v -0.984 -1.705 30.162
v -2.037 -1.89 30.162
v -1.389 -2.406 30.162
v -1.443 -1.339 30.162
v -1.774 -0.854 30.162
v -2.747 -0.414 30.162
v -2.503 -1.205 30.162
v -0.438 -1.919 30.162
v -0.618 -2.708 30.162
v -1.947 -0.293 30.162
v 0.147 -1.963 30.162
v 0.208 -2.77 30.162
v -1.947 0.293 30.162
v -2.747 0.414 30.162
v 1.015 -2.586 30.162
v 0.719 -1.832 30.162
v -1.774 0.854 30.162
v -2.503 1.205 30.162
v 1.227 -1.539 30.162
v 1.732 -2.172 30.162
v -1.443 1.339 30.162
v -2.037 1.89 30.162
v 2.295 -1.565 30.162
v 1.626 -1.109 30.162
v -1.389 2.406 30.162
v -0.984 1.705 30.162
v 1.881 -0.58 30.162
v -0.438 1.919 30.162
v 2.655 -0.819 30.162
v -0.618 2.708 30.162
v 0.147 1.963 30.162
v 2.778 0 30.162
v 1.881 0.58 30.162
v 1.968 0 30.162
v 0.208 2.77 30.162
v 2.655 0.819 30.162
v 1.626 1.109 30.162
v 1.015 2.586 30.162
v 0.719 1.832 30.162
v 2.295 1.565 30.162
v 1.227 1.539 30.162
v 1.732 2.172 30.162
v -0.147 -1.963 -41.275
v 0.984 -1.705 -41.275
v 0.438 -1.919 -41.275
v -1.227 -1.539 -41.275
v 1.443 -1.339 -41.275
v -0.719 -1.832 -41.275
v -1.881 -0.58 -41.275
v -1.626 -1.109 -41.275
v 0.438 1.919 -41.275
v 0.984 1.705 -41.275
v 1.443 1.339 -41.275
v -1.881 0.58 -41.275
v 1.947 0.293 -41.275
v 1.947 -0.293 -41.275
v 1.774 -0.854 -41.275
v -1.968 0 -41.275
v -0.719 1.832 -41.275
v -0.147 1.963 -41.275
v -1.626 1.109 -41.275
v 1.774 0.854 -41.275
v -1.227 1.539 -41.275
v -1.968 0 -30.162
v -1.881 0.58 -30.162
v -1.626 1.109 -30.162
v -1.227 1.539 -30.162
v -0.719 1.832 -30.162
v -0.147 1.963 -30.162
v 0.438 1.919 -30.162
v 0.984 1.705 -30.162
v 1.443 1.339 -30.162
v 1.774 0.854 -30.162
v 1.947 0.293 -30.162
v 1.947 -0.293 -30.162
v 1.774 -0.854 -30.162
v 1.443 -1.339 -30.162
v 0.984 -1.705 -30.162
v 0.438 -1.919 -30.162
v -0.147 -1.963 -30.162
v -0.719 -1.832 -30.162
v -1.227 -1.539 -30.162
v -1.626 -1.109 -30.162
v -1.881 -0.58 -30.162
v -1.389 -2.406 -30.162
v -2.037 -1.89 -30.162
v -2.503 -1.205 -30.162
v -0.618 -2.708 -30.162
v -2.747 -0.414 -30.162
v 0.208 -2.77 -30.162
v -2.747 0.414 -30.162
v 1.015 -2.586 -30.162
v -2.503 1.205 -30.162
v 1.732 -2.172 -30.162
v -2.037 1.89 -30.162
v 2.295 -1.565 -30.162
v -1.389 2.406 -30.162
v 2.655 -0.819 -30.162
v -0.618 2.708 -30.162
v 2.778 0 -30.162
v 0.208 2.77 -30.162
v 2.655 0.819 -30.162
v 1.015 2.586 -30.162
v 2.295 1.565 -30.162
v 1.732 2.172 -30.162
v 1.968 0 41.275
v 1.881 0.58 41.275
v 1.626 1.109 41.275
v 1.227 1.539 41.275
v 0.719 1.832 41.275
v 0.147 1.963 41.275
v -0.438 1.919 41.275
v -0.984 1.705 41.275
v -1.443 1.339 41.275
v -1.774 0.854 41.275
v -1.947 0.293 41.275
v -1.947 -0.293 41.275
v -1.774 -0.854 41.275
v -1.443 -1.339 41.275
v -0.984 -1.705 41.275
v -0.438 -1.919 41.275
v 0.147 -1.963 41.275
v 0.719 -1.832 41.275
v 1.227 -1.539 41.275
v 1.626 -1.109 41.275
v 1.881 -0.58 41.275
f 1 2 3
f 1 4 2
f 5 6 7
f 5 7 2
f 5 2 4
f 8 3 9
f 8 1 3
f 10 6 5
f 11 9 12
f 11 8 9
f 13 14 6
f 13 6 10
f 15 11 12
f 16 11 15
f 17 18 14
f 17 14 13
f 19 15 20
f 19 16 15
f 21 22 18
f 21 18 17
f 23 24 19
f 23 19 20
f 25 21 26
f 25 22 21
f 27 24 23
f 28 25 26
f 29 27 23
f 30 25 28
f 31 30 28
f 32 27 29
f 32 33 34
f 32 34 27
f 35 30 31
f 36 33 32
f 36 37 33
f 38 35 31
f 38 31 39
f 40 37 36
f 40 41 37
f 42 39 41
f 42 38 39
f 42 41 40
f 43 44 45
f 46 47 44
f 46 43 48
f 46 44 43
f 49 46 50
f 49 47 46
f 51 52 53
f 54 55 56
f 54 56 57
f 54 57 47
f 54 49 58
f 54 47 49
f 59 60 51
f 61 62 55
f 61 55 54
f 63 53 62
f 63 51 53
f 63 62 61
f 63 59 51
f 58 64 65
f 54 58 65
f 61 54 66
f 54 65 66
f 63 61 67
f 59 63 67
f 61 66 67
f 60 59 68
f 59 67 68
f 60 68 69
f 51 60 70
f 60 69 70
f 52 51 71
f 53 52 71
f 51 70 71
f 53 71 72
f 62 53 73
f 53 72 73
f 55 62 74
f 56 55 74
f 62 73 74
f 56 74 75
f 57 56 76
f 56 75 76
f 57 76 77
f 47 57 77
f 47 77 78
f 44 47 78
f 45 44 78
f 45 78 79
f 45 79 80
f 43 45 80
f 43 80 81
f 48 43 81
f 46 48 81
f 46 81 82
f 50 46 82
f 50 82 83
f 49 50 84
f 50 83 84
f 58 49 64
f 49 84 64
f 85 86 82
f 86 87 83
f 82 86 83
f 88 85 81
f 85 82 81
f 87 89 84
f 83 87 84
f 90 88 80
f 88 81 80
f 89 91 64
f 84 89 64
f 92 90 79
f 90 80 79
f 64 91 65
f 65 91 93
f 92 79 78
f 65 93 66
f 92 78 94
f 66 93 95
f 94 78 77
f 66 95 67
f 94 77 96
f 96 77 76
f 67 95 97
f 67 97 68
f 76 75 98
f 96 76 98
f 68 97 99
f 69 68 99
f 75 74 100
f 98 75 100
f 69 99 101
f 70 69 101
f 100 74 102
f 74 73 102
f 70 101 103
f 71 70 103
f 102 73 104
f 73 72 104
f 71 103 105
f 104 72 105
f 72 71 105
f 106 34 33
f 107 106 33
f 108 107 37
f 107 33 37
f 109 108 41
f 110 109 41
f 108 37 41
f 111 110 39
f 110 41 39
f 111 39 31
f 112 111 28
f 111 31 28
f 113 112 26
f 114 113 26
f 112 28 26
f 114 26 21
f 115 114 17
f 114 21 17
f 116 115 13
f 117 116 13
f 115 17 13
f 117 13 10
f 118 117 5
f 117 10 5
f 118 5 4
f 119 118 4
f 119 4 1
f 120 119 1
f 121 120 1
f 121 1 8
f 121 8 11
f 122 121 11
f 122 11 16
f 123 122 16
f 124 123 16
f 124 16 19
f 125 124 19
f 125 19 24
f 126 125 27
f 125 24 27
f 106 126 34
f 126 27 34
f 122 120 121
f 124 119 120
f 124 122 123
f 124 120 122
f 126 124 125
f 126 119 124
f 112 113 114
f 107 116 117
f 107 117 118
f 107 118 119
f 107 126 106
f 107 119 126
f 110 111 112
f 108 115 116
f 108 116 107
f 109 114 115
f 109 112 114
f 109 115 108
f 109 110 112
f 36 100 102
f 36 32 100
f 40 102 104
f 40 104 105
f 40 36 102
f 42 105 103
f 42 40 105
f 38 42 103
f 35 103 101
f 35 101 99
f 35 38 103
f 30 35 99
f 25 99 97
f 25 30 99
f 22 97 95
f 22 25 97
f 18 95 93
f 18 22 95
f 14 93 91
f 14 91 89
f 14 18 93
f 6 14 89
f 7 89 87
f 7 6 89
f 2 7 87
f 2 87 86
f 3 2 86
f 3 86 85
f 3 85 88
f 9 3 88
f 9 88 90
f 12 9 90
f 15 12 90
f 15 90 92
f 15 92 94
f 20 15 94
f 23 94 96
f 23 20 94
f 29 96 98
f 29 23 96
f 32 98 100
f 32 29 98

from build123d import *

# Parameters (mm, degrees)
SKETCH2_R      = 2.778125
EXTRUDE1_DEPTH = 30.1625
SKETCH3_R      = 1.9685
EXTRUDE2_DEPTH = 11.1125
SKETCH4_R      = 1.9685
EXTRUDE3_DEPTH = 11.1125


with BuildPart() as part:
    # Sketch2 → Extrude1 (new body, symmetric)
    with BuildSketch(Plane.XY):
        Circle(SKETCH2_R)
    extrude(amount=EXTRUDE1_DEPTH, both=True)

    # Sketch3 → Extrude2 (add)
    with BuildSketch(Plane.XY.offset(30.1625)):
        Circle(SKETCH3_R)
    extrude(amount=EXTRUDE2_DEPTH)

    # Sketch4 → Extrude3 (add)
    with BuildSketch(Plane(origin=(0, 0, -30.1625), x_dir=(-1, 0, 0), z_dir=(0, 0, -1))):
        Circle(SKETCH4_R)
    extrude(amount=EXTRUDE3_DEPTH)


solid = part.part
